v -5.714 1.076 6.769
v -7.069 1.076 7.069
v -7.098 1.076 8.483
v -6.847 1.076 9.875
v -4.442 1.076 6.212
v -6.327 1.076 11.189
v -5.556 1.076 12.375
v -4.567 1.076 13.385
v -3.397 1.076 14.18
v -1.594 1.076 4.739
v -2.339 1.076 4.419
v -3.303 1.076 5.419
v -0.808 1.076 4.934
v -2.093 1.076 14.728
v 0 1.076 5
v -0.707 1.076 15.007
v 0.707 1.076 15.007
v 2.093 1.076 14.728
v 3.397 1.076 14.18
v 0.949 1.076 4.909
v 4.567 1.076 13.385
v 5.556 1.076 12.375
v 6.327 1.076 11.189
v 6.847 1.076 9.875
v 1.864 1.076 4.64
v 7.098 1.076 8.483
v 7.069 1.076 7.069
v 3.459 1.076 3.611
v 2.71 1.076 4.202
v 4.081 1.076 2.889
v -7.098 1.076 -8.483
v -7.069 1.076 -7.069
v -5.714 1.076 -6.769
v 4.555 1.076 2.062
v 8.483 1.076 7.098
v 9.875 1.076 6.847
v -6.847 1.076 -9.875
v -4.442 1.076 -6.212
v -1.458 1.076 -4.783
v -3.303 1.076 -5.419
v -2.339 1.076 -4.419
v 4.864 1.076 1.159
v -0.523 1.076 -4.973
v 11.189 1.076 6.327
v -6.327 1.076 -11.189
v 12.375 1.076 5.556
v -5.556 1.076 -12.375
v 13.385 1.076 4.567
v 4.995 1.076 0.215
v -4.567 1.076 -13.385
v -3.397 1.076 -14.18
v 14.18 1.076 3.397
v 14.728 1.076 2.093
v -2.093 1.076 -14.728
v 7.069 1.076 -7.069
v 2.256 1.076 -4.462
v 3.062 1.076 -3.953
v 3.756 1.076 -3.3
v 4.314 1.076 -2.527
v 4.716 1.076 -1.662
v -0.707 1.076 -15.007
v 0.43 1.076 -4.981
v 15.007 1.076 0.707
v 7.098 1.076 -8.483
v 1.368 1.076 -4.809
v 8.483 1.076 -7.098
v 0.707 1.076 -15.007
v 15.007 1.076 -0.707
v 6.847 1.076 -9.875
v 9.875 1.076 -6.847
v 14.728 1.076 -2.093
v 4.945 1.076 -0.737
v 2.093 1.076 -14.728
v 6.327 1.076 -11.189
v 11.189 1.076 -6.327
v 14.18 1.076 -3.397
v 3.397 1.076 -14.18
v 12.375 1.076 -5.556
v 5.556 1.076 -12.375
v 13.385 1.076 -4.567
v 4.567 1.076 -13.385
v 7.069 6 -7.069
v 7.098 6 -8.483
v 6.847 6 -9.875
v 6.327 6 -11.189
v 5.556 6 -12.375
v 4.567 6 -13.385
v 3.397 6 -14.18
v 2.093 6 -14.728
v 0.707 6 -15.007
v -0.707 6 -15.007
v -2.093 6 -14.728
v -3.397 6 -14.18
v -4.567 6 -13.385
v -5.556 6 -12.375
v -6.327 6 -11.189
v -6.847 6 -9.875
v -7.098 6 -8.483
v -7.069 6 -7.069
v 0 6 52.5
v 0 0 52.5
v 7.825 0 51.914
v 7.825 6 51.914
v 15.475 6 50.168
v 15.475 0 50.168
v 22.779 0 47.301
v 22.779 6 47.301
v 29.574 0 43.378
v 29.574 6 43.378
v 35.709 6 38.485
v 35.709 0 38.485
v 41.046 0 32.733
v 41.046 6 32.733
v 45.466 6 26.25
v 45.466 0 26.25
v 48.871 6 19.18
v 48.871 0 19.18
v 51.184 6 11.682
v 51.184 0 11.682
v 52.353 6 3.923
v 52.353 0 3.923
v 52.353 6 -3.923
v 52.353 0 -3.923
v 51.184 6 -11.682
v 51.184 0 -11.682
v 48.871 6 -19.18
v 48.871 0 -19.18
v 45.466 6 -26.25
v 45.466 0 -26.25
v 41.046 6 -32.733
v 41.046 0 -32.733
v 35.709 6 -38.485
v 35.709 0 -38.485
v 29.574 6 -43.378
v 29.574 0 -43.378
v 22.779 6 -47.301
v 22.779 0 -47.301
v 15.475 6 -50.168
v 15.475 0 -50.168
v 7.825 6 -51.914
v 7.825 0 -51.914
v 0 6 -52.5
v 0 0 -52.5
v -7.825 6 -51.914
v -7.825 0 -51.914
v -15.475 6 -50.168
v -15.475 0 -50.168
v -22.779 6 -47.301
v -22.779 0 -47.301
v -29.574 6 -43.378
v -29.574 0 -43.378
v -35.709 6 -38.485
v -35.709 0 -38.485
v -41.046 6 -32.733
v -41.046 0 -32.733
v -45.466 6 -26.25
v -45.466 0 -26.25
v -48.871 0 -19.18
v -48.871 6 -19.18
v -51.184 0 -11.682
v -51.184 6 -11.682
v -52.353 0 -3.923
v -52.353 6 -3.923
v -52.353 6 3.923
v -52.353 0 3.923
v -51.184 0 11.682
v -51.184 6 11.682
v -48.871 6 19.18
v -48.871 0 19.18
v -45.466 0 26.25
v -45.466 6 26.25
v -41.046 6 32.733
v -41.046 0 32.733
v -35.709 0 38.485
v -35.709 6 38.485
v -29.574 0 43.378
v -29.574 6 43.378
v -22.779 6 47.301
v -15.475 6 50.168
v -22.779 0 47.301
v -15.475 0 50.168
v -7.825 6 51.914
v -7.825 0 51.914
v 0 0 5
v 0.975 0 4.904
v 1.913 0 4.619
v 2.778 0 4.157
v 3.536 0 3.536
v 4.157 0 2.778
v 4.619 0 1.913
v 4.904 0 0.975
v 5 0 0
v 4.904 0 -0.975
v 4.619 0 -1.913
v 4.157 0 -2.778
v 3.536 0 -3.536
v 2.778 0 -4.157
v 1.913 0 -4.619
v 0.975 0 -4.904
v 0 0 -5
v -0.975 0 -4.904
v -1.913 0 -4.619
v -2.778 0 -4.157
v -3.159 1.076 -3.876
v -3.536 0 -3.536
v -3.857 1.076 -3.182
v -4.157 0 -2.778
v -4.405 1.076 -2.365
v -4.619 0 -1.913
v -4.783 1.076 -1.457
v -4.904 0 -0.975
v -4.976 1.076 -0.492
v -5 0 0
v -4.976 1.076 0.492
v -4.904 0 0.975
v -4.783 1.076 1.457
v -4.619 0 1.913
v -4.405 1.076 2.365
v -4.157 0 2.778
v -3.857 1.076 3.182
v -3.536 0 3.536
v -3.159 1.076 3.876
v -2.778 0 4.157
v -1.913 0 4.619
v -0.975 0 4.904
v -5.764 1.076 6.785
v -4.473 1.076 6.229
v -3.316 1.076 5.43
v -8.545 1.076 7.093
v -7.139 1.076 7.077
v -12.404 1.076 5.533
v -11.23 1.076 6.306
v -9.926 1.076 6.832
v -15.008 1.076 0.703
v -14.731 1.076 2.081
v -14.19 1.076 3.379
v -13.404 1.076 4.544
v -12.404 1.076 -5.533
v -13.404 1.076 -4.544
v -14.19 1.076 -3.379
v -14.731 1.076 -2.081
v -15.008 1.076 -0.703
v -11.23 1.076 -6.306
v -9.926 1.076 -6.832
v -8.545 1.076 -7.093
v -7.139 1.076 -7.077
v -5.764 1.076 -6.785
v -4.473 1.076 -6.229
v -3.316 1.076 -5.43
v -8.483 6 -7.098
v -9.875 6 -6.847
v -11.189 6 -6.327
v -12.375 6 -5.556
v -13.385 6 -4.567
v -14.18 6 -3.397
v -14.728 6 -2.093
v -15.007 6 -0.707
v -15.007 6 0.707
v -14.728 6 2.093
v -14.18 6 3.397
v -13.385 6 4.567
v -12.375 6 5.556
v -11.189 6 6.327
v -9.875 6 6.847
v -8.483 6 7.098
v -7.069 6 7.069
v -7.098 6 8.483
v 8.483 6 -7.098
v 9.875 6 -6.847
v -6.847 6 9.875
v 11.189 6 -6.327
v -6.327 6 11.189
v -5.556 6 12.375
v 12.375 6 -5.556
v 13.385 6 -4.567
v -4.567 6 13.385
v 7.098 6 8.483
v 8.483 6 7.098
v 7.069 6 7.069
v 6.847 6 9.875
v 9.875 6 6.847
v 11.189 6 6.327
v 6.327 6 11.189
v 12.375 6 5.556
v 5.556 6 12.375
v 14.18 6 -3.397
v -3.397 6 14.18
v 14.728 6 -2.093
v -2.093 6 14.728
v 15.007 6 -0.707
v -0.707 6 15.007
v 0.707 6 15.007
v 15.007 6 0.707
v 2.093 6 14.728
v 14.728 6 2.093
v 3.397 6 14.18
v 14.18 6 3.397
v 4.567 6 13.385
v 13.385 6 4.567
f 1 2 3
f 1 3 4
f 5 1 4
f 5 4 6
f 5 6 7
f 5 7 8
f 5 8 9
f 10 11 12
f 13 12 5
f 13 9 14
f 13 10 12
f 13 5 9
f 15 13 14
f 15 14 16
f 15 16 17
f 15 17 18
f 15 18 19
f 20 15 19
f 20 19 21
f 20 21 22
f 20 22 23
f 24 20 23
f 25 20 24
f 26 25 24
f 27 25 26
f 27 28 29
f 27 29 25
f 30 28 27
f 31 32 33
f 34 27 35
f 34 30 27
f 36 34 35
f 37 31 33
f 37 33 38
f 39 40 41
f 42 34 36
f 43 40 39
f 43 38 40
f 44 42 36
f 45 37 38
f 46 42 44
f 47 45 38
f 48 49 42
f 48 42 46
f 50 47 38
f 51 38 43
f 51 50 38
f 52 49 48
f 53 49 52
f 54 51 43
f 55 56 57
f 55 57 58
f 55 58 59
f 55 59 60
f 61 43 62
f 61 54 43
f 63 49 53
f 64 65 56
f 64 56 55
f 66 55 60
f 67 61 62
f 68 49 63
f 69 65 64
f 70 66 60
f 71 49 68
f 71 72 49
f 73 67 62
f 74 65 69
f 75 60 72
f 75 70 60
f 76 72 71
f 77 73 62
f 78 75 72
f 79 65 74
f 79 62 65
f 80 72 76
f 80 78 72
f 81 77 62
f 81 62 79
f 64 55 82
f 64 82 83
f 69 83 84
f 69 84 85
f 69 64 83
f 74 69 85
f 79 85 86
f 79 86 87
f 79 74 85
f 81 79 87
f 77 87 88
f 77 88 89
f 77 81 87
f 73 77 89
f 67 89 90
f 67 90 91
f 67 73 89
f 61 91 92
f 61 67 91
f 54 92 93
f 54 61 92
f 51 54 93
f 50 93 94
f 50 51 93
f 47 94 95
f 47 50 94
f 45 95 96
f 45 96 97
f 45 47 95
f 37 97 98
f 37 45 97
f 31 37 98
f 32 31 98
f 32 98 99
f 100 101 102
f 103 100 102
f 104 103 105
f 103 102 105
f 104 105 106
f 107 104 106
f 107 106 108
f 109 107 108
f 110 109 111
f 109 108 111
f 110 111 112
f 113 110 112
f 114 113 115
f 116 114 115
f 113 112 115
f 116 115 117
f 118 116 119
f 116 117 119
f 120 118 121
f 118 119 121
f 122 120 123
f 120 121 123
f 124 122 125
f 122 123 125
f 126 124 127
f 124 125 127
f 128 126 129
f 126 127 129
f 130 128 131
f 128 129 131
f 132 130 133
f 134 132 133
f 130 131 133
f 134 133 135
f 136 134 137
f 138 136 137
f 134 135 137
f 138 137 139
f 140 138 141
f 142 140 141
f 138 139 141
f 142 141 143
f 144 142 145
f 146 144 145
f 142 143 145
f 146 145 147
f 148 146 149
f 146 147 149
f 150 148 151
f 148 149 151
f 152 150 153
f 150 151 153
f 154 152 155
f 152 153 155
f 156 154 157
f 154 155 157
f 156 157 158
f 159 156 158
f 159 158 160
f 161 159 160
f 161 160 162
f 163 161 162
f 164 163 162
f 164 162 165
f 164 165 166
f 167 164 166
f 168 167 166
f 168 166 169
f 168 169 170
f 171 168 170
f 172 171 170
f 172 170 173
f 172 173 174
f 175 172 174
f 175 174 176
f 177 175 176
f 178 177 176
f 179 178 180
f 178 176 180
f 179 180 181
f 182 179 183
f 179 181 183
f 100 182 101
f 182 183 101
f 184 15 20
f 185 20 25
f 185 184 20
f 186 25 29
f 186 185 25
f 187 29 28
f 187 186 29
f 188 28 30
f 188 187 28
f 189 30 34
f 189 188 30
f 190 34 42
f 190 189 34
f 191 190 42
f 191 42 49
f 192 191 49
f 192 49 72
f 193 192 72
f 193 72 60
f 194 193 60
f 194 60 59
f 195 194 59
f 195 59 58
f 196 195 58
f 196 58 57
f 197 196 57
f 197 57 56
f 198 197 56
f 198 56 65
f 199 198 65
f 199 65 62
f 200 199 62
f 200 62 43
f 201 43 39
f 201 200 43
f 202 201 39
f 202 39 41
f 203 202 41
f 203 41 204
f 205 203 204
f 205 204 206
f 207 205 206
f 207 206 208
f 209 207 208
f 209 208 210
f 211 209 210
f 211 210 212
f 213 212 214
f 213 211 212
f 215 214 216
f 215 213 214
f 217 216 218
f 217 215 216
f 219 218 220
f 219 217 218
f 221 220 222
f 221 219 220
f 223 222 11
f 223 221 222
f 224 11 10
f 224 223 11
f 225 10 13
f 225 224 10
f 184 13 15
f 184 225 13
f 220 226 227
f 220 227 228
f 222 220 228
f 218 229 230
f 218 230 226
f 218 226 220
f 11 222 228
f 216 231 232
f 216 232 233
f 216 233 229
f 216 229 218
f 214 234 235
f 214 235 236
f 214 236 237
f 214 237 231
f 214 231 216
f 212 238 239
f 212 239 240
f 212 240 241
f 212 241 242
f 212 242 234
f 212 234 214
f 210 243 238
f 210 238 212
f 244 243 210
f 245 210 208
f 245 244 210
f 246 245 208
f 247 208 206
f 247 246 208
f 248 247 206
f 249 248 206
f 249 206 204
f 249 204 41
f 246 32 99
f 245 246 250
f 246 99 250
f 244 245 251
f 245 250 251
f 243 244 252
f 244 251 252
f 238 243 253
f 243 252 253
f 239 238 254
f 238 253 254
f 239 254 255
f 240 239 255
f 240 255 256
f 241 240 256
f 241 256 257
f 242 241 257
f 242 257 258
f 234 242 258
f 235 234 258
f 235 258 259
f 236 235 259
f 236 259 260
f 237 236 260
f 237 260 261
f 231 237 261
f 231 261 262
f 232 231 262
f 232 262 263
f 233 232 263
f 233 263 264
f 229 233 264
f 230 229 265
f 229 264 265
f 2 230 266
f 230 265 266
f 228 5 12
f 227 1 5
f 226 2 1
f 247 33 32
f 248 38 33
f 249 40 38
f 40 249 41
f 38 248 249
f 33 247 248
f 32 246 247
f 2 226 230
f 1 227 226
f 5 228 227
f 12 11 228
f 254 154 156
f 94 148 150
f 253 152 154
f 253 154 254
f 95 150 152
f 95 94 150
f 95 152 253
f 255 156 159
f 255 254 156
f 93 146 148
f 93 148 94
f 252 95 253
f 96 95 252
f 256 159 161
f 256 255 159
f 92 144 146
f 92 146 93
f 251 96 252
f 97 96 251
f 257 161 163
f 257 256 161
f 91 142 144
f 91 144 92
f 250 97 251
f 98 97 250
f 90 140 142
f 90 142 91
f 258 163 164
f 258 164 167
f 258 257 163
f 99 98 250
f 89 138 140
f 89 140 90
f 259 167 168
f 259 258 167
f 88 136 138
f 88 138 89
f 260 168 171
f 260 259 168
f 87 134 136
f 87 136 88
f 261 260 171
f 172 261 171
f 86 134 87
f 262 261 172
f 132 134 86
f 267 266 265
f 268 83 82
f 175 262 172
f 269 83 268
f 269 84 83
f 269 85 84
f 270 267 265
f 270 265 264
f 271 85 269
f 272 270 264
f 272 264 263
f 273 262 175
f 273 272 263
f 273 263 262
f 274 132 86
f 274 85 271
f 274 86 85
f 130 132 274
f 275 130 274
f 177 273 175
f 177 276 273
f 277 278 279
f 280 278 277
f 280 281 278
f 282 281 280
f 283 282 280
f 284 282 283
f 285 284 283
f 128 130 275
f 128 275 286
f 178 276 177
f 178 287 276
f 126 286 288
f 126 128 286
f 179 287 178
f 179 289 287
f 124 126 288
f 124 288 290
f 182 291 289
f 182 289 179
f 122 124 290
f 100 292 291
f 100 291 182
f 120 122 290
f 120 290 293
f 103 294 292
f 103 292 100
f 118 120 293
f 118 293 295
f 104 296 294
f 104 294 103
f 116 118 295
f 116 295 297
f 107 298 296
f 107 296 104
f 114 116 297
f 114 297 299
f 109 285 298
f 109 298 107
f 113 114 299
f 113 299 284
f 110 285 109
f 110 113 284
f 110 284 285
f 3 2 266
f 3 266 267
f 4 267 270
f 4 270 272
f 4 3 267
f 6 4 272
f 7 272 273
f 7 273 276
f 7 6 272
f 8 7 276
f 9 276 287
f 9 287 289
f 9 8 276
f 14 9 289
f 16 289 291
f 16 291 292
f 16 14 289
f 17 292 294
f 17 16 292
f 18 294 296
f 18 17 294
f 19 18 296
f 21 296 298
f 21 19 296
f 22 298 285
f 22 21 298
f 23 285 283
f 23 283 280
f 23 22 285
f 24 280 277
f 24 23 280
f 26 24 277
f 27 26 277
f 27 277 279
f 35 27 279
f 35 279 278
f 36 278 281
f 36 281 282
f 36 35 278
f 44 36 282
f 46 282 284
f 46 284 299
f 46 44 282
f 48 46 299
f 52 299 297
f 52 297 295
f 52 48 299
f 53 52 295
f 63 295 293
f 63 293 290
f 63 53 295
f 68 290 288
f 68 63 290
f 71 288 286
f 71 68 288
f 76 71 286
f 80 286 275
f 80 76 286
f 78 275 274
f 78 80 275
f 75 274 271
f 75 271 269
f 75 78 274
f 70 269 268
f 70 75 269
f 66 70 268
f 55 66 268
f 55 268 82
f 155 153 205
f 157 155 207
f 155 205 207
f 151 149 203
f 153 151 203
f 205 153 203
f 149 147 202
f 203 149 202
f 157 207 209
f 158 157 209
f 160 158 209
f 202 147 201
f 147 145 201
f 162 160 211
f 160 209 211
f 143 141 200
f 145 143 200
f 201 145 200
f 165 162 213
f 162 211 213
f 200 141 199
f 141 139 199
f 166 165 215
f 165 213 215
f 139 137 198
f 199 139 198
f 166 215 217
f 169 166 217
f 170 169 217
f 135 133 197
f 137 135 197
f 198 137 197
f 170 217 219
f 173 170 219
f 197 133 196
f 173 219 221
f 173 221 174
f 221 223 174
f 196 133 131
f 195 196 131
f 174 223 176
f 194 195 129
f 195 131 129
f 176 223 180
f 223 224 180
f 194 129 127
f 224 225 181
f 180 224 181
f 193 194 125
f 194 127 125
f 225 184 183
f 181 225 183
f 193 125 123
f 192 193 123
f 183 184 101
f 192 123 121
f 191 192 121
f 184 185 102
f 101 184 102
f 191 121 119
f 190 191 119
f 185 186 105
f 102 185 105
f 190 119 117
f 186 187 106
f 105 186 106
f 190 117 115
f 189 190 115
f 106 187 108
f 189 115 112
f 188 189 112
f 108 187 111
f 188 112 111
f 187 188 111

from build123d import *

# Parameters (mm, degrees)
SKETCH1_R           = 52.5
BOSS_EXTRUDE1_DEPTH = 6
SKETCH2_R           = 5
CUT_EXTRUDE1_DEPTH  = 75.488254108
SKETCH3_R           = 7.120379286
CUT_EXTRUDE2_DEPTH  = 4.924025576
CIRPATTERN1_COUNT   = 4


with BuildPart() as part:
    # Sketch1 → Boss-Extrude1 (new body)
    with BuildSketch(Plane(origin=(0, 0, 0), x_dir=(1, 0, 0), z_dir=(0, 1, 0))):
        Circle(SKETCH1_R)
    extrude(amount=BOSS_EXTRUDE1_DEPTH)

    # Sketch2 → Cut-Extrude1 (cut, through all)
    with BuildSketch(Plane(origin=(0, 0, 0), x_dir=(1, 0, 0), z_dir=(0, 1, 0))):
        Circle(SKETCH2_R)
    extrude(amount=CUT_EXTRUDE1_DEPTH, mode=Mode.SUBTRACT)

    # Sketch3 → Cut-Extrude2 (cut)
    with BuildSketch(Plane(origin=(0, 6, 0), x_dir=(1, 0, 0), z_dir=(0, 1, 0))):
        with Locations((-7.922010369, 0)):
            Circle(SKETCH3_R)
    cut_extrude2 = extrude(amount=-CUT_EXTRUDE2_DEPTH, mode=Mode.SUBTRACT)

    # CirPattern1: Cut-Extrude2 ×4 about axis
    cirpattern1_axis = Axis((0, 0, 0), (0, 1, 0))
    for i in range(1, CIRPATTERN1_COUNT):
        add(cut_extrude2.rotate(cirpattern1_axis, i * 360 / CIRPATTERN1_COUNT), mode=Mode.SUBTRACT)


solid = part.part
